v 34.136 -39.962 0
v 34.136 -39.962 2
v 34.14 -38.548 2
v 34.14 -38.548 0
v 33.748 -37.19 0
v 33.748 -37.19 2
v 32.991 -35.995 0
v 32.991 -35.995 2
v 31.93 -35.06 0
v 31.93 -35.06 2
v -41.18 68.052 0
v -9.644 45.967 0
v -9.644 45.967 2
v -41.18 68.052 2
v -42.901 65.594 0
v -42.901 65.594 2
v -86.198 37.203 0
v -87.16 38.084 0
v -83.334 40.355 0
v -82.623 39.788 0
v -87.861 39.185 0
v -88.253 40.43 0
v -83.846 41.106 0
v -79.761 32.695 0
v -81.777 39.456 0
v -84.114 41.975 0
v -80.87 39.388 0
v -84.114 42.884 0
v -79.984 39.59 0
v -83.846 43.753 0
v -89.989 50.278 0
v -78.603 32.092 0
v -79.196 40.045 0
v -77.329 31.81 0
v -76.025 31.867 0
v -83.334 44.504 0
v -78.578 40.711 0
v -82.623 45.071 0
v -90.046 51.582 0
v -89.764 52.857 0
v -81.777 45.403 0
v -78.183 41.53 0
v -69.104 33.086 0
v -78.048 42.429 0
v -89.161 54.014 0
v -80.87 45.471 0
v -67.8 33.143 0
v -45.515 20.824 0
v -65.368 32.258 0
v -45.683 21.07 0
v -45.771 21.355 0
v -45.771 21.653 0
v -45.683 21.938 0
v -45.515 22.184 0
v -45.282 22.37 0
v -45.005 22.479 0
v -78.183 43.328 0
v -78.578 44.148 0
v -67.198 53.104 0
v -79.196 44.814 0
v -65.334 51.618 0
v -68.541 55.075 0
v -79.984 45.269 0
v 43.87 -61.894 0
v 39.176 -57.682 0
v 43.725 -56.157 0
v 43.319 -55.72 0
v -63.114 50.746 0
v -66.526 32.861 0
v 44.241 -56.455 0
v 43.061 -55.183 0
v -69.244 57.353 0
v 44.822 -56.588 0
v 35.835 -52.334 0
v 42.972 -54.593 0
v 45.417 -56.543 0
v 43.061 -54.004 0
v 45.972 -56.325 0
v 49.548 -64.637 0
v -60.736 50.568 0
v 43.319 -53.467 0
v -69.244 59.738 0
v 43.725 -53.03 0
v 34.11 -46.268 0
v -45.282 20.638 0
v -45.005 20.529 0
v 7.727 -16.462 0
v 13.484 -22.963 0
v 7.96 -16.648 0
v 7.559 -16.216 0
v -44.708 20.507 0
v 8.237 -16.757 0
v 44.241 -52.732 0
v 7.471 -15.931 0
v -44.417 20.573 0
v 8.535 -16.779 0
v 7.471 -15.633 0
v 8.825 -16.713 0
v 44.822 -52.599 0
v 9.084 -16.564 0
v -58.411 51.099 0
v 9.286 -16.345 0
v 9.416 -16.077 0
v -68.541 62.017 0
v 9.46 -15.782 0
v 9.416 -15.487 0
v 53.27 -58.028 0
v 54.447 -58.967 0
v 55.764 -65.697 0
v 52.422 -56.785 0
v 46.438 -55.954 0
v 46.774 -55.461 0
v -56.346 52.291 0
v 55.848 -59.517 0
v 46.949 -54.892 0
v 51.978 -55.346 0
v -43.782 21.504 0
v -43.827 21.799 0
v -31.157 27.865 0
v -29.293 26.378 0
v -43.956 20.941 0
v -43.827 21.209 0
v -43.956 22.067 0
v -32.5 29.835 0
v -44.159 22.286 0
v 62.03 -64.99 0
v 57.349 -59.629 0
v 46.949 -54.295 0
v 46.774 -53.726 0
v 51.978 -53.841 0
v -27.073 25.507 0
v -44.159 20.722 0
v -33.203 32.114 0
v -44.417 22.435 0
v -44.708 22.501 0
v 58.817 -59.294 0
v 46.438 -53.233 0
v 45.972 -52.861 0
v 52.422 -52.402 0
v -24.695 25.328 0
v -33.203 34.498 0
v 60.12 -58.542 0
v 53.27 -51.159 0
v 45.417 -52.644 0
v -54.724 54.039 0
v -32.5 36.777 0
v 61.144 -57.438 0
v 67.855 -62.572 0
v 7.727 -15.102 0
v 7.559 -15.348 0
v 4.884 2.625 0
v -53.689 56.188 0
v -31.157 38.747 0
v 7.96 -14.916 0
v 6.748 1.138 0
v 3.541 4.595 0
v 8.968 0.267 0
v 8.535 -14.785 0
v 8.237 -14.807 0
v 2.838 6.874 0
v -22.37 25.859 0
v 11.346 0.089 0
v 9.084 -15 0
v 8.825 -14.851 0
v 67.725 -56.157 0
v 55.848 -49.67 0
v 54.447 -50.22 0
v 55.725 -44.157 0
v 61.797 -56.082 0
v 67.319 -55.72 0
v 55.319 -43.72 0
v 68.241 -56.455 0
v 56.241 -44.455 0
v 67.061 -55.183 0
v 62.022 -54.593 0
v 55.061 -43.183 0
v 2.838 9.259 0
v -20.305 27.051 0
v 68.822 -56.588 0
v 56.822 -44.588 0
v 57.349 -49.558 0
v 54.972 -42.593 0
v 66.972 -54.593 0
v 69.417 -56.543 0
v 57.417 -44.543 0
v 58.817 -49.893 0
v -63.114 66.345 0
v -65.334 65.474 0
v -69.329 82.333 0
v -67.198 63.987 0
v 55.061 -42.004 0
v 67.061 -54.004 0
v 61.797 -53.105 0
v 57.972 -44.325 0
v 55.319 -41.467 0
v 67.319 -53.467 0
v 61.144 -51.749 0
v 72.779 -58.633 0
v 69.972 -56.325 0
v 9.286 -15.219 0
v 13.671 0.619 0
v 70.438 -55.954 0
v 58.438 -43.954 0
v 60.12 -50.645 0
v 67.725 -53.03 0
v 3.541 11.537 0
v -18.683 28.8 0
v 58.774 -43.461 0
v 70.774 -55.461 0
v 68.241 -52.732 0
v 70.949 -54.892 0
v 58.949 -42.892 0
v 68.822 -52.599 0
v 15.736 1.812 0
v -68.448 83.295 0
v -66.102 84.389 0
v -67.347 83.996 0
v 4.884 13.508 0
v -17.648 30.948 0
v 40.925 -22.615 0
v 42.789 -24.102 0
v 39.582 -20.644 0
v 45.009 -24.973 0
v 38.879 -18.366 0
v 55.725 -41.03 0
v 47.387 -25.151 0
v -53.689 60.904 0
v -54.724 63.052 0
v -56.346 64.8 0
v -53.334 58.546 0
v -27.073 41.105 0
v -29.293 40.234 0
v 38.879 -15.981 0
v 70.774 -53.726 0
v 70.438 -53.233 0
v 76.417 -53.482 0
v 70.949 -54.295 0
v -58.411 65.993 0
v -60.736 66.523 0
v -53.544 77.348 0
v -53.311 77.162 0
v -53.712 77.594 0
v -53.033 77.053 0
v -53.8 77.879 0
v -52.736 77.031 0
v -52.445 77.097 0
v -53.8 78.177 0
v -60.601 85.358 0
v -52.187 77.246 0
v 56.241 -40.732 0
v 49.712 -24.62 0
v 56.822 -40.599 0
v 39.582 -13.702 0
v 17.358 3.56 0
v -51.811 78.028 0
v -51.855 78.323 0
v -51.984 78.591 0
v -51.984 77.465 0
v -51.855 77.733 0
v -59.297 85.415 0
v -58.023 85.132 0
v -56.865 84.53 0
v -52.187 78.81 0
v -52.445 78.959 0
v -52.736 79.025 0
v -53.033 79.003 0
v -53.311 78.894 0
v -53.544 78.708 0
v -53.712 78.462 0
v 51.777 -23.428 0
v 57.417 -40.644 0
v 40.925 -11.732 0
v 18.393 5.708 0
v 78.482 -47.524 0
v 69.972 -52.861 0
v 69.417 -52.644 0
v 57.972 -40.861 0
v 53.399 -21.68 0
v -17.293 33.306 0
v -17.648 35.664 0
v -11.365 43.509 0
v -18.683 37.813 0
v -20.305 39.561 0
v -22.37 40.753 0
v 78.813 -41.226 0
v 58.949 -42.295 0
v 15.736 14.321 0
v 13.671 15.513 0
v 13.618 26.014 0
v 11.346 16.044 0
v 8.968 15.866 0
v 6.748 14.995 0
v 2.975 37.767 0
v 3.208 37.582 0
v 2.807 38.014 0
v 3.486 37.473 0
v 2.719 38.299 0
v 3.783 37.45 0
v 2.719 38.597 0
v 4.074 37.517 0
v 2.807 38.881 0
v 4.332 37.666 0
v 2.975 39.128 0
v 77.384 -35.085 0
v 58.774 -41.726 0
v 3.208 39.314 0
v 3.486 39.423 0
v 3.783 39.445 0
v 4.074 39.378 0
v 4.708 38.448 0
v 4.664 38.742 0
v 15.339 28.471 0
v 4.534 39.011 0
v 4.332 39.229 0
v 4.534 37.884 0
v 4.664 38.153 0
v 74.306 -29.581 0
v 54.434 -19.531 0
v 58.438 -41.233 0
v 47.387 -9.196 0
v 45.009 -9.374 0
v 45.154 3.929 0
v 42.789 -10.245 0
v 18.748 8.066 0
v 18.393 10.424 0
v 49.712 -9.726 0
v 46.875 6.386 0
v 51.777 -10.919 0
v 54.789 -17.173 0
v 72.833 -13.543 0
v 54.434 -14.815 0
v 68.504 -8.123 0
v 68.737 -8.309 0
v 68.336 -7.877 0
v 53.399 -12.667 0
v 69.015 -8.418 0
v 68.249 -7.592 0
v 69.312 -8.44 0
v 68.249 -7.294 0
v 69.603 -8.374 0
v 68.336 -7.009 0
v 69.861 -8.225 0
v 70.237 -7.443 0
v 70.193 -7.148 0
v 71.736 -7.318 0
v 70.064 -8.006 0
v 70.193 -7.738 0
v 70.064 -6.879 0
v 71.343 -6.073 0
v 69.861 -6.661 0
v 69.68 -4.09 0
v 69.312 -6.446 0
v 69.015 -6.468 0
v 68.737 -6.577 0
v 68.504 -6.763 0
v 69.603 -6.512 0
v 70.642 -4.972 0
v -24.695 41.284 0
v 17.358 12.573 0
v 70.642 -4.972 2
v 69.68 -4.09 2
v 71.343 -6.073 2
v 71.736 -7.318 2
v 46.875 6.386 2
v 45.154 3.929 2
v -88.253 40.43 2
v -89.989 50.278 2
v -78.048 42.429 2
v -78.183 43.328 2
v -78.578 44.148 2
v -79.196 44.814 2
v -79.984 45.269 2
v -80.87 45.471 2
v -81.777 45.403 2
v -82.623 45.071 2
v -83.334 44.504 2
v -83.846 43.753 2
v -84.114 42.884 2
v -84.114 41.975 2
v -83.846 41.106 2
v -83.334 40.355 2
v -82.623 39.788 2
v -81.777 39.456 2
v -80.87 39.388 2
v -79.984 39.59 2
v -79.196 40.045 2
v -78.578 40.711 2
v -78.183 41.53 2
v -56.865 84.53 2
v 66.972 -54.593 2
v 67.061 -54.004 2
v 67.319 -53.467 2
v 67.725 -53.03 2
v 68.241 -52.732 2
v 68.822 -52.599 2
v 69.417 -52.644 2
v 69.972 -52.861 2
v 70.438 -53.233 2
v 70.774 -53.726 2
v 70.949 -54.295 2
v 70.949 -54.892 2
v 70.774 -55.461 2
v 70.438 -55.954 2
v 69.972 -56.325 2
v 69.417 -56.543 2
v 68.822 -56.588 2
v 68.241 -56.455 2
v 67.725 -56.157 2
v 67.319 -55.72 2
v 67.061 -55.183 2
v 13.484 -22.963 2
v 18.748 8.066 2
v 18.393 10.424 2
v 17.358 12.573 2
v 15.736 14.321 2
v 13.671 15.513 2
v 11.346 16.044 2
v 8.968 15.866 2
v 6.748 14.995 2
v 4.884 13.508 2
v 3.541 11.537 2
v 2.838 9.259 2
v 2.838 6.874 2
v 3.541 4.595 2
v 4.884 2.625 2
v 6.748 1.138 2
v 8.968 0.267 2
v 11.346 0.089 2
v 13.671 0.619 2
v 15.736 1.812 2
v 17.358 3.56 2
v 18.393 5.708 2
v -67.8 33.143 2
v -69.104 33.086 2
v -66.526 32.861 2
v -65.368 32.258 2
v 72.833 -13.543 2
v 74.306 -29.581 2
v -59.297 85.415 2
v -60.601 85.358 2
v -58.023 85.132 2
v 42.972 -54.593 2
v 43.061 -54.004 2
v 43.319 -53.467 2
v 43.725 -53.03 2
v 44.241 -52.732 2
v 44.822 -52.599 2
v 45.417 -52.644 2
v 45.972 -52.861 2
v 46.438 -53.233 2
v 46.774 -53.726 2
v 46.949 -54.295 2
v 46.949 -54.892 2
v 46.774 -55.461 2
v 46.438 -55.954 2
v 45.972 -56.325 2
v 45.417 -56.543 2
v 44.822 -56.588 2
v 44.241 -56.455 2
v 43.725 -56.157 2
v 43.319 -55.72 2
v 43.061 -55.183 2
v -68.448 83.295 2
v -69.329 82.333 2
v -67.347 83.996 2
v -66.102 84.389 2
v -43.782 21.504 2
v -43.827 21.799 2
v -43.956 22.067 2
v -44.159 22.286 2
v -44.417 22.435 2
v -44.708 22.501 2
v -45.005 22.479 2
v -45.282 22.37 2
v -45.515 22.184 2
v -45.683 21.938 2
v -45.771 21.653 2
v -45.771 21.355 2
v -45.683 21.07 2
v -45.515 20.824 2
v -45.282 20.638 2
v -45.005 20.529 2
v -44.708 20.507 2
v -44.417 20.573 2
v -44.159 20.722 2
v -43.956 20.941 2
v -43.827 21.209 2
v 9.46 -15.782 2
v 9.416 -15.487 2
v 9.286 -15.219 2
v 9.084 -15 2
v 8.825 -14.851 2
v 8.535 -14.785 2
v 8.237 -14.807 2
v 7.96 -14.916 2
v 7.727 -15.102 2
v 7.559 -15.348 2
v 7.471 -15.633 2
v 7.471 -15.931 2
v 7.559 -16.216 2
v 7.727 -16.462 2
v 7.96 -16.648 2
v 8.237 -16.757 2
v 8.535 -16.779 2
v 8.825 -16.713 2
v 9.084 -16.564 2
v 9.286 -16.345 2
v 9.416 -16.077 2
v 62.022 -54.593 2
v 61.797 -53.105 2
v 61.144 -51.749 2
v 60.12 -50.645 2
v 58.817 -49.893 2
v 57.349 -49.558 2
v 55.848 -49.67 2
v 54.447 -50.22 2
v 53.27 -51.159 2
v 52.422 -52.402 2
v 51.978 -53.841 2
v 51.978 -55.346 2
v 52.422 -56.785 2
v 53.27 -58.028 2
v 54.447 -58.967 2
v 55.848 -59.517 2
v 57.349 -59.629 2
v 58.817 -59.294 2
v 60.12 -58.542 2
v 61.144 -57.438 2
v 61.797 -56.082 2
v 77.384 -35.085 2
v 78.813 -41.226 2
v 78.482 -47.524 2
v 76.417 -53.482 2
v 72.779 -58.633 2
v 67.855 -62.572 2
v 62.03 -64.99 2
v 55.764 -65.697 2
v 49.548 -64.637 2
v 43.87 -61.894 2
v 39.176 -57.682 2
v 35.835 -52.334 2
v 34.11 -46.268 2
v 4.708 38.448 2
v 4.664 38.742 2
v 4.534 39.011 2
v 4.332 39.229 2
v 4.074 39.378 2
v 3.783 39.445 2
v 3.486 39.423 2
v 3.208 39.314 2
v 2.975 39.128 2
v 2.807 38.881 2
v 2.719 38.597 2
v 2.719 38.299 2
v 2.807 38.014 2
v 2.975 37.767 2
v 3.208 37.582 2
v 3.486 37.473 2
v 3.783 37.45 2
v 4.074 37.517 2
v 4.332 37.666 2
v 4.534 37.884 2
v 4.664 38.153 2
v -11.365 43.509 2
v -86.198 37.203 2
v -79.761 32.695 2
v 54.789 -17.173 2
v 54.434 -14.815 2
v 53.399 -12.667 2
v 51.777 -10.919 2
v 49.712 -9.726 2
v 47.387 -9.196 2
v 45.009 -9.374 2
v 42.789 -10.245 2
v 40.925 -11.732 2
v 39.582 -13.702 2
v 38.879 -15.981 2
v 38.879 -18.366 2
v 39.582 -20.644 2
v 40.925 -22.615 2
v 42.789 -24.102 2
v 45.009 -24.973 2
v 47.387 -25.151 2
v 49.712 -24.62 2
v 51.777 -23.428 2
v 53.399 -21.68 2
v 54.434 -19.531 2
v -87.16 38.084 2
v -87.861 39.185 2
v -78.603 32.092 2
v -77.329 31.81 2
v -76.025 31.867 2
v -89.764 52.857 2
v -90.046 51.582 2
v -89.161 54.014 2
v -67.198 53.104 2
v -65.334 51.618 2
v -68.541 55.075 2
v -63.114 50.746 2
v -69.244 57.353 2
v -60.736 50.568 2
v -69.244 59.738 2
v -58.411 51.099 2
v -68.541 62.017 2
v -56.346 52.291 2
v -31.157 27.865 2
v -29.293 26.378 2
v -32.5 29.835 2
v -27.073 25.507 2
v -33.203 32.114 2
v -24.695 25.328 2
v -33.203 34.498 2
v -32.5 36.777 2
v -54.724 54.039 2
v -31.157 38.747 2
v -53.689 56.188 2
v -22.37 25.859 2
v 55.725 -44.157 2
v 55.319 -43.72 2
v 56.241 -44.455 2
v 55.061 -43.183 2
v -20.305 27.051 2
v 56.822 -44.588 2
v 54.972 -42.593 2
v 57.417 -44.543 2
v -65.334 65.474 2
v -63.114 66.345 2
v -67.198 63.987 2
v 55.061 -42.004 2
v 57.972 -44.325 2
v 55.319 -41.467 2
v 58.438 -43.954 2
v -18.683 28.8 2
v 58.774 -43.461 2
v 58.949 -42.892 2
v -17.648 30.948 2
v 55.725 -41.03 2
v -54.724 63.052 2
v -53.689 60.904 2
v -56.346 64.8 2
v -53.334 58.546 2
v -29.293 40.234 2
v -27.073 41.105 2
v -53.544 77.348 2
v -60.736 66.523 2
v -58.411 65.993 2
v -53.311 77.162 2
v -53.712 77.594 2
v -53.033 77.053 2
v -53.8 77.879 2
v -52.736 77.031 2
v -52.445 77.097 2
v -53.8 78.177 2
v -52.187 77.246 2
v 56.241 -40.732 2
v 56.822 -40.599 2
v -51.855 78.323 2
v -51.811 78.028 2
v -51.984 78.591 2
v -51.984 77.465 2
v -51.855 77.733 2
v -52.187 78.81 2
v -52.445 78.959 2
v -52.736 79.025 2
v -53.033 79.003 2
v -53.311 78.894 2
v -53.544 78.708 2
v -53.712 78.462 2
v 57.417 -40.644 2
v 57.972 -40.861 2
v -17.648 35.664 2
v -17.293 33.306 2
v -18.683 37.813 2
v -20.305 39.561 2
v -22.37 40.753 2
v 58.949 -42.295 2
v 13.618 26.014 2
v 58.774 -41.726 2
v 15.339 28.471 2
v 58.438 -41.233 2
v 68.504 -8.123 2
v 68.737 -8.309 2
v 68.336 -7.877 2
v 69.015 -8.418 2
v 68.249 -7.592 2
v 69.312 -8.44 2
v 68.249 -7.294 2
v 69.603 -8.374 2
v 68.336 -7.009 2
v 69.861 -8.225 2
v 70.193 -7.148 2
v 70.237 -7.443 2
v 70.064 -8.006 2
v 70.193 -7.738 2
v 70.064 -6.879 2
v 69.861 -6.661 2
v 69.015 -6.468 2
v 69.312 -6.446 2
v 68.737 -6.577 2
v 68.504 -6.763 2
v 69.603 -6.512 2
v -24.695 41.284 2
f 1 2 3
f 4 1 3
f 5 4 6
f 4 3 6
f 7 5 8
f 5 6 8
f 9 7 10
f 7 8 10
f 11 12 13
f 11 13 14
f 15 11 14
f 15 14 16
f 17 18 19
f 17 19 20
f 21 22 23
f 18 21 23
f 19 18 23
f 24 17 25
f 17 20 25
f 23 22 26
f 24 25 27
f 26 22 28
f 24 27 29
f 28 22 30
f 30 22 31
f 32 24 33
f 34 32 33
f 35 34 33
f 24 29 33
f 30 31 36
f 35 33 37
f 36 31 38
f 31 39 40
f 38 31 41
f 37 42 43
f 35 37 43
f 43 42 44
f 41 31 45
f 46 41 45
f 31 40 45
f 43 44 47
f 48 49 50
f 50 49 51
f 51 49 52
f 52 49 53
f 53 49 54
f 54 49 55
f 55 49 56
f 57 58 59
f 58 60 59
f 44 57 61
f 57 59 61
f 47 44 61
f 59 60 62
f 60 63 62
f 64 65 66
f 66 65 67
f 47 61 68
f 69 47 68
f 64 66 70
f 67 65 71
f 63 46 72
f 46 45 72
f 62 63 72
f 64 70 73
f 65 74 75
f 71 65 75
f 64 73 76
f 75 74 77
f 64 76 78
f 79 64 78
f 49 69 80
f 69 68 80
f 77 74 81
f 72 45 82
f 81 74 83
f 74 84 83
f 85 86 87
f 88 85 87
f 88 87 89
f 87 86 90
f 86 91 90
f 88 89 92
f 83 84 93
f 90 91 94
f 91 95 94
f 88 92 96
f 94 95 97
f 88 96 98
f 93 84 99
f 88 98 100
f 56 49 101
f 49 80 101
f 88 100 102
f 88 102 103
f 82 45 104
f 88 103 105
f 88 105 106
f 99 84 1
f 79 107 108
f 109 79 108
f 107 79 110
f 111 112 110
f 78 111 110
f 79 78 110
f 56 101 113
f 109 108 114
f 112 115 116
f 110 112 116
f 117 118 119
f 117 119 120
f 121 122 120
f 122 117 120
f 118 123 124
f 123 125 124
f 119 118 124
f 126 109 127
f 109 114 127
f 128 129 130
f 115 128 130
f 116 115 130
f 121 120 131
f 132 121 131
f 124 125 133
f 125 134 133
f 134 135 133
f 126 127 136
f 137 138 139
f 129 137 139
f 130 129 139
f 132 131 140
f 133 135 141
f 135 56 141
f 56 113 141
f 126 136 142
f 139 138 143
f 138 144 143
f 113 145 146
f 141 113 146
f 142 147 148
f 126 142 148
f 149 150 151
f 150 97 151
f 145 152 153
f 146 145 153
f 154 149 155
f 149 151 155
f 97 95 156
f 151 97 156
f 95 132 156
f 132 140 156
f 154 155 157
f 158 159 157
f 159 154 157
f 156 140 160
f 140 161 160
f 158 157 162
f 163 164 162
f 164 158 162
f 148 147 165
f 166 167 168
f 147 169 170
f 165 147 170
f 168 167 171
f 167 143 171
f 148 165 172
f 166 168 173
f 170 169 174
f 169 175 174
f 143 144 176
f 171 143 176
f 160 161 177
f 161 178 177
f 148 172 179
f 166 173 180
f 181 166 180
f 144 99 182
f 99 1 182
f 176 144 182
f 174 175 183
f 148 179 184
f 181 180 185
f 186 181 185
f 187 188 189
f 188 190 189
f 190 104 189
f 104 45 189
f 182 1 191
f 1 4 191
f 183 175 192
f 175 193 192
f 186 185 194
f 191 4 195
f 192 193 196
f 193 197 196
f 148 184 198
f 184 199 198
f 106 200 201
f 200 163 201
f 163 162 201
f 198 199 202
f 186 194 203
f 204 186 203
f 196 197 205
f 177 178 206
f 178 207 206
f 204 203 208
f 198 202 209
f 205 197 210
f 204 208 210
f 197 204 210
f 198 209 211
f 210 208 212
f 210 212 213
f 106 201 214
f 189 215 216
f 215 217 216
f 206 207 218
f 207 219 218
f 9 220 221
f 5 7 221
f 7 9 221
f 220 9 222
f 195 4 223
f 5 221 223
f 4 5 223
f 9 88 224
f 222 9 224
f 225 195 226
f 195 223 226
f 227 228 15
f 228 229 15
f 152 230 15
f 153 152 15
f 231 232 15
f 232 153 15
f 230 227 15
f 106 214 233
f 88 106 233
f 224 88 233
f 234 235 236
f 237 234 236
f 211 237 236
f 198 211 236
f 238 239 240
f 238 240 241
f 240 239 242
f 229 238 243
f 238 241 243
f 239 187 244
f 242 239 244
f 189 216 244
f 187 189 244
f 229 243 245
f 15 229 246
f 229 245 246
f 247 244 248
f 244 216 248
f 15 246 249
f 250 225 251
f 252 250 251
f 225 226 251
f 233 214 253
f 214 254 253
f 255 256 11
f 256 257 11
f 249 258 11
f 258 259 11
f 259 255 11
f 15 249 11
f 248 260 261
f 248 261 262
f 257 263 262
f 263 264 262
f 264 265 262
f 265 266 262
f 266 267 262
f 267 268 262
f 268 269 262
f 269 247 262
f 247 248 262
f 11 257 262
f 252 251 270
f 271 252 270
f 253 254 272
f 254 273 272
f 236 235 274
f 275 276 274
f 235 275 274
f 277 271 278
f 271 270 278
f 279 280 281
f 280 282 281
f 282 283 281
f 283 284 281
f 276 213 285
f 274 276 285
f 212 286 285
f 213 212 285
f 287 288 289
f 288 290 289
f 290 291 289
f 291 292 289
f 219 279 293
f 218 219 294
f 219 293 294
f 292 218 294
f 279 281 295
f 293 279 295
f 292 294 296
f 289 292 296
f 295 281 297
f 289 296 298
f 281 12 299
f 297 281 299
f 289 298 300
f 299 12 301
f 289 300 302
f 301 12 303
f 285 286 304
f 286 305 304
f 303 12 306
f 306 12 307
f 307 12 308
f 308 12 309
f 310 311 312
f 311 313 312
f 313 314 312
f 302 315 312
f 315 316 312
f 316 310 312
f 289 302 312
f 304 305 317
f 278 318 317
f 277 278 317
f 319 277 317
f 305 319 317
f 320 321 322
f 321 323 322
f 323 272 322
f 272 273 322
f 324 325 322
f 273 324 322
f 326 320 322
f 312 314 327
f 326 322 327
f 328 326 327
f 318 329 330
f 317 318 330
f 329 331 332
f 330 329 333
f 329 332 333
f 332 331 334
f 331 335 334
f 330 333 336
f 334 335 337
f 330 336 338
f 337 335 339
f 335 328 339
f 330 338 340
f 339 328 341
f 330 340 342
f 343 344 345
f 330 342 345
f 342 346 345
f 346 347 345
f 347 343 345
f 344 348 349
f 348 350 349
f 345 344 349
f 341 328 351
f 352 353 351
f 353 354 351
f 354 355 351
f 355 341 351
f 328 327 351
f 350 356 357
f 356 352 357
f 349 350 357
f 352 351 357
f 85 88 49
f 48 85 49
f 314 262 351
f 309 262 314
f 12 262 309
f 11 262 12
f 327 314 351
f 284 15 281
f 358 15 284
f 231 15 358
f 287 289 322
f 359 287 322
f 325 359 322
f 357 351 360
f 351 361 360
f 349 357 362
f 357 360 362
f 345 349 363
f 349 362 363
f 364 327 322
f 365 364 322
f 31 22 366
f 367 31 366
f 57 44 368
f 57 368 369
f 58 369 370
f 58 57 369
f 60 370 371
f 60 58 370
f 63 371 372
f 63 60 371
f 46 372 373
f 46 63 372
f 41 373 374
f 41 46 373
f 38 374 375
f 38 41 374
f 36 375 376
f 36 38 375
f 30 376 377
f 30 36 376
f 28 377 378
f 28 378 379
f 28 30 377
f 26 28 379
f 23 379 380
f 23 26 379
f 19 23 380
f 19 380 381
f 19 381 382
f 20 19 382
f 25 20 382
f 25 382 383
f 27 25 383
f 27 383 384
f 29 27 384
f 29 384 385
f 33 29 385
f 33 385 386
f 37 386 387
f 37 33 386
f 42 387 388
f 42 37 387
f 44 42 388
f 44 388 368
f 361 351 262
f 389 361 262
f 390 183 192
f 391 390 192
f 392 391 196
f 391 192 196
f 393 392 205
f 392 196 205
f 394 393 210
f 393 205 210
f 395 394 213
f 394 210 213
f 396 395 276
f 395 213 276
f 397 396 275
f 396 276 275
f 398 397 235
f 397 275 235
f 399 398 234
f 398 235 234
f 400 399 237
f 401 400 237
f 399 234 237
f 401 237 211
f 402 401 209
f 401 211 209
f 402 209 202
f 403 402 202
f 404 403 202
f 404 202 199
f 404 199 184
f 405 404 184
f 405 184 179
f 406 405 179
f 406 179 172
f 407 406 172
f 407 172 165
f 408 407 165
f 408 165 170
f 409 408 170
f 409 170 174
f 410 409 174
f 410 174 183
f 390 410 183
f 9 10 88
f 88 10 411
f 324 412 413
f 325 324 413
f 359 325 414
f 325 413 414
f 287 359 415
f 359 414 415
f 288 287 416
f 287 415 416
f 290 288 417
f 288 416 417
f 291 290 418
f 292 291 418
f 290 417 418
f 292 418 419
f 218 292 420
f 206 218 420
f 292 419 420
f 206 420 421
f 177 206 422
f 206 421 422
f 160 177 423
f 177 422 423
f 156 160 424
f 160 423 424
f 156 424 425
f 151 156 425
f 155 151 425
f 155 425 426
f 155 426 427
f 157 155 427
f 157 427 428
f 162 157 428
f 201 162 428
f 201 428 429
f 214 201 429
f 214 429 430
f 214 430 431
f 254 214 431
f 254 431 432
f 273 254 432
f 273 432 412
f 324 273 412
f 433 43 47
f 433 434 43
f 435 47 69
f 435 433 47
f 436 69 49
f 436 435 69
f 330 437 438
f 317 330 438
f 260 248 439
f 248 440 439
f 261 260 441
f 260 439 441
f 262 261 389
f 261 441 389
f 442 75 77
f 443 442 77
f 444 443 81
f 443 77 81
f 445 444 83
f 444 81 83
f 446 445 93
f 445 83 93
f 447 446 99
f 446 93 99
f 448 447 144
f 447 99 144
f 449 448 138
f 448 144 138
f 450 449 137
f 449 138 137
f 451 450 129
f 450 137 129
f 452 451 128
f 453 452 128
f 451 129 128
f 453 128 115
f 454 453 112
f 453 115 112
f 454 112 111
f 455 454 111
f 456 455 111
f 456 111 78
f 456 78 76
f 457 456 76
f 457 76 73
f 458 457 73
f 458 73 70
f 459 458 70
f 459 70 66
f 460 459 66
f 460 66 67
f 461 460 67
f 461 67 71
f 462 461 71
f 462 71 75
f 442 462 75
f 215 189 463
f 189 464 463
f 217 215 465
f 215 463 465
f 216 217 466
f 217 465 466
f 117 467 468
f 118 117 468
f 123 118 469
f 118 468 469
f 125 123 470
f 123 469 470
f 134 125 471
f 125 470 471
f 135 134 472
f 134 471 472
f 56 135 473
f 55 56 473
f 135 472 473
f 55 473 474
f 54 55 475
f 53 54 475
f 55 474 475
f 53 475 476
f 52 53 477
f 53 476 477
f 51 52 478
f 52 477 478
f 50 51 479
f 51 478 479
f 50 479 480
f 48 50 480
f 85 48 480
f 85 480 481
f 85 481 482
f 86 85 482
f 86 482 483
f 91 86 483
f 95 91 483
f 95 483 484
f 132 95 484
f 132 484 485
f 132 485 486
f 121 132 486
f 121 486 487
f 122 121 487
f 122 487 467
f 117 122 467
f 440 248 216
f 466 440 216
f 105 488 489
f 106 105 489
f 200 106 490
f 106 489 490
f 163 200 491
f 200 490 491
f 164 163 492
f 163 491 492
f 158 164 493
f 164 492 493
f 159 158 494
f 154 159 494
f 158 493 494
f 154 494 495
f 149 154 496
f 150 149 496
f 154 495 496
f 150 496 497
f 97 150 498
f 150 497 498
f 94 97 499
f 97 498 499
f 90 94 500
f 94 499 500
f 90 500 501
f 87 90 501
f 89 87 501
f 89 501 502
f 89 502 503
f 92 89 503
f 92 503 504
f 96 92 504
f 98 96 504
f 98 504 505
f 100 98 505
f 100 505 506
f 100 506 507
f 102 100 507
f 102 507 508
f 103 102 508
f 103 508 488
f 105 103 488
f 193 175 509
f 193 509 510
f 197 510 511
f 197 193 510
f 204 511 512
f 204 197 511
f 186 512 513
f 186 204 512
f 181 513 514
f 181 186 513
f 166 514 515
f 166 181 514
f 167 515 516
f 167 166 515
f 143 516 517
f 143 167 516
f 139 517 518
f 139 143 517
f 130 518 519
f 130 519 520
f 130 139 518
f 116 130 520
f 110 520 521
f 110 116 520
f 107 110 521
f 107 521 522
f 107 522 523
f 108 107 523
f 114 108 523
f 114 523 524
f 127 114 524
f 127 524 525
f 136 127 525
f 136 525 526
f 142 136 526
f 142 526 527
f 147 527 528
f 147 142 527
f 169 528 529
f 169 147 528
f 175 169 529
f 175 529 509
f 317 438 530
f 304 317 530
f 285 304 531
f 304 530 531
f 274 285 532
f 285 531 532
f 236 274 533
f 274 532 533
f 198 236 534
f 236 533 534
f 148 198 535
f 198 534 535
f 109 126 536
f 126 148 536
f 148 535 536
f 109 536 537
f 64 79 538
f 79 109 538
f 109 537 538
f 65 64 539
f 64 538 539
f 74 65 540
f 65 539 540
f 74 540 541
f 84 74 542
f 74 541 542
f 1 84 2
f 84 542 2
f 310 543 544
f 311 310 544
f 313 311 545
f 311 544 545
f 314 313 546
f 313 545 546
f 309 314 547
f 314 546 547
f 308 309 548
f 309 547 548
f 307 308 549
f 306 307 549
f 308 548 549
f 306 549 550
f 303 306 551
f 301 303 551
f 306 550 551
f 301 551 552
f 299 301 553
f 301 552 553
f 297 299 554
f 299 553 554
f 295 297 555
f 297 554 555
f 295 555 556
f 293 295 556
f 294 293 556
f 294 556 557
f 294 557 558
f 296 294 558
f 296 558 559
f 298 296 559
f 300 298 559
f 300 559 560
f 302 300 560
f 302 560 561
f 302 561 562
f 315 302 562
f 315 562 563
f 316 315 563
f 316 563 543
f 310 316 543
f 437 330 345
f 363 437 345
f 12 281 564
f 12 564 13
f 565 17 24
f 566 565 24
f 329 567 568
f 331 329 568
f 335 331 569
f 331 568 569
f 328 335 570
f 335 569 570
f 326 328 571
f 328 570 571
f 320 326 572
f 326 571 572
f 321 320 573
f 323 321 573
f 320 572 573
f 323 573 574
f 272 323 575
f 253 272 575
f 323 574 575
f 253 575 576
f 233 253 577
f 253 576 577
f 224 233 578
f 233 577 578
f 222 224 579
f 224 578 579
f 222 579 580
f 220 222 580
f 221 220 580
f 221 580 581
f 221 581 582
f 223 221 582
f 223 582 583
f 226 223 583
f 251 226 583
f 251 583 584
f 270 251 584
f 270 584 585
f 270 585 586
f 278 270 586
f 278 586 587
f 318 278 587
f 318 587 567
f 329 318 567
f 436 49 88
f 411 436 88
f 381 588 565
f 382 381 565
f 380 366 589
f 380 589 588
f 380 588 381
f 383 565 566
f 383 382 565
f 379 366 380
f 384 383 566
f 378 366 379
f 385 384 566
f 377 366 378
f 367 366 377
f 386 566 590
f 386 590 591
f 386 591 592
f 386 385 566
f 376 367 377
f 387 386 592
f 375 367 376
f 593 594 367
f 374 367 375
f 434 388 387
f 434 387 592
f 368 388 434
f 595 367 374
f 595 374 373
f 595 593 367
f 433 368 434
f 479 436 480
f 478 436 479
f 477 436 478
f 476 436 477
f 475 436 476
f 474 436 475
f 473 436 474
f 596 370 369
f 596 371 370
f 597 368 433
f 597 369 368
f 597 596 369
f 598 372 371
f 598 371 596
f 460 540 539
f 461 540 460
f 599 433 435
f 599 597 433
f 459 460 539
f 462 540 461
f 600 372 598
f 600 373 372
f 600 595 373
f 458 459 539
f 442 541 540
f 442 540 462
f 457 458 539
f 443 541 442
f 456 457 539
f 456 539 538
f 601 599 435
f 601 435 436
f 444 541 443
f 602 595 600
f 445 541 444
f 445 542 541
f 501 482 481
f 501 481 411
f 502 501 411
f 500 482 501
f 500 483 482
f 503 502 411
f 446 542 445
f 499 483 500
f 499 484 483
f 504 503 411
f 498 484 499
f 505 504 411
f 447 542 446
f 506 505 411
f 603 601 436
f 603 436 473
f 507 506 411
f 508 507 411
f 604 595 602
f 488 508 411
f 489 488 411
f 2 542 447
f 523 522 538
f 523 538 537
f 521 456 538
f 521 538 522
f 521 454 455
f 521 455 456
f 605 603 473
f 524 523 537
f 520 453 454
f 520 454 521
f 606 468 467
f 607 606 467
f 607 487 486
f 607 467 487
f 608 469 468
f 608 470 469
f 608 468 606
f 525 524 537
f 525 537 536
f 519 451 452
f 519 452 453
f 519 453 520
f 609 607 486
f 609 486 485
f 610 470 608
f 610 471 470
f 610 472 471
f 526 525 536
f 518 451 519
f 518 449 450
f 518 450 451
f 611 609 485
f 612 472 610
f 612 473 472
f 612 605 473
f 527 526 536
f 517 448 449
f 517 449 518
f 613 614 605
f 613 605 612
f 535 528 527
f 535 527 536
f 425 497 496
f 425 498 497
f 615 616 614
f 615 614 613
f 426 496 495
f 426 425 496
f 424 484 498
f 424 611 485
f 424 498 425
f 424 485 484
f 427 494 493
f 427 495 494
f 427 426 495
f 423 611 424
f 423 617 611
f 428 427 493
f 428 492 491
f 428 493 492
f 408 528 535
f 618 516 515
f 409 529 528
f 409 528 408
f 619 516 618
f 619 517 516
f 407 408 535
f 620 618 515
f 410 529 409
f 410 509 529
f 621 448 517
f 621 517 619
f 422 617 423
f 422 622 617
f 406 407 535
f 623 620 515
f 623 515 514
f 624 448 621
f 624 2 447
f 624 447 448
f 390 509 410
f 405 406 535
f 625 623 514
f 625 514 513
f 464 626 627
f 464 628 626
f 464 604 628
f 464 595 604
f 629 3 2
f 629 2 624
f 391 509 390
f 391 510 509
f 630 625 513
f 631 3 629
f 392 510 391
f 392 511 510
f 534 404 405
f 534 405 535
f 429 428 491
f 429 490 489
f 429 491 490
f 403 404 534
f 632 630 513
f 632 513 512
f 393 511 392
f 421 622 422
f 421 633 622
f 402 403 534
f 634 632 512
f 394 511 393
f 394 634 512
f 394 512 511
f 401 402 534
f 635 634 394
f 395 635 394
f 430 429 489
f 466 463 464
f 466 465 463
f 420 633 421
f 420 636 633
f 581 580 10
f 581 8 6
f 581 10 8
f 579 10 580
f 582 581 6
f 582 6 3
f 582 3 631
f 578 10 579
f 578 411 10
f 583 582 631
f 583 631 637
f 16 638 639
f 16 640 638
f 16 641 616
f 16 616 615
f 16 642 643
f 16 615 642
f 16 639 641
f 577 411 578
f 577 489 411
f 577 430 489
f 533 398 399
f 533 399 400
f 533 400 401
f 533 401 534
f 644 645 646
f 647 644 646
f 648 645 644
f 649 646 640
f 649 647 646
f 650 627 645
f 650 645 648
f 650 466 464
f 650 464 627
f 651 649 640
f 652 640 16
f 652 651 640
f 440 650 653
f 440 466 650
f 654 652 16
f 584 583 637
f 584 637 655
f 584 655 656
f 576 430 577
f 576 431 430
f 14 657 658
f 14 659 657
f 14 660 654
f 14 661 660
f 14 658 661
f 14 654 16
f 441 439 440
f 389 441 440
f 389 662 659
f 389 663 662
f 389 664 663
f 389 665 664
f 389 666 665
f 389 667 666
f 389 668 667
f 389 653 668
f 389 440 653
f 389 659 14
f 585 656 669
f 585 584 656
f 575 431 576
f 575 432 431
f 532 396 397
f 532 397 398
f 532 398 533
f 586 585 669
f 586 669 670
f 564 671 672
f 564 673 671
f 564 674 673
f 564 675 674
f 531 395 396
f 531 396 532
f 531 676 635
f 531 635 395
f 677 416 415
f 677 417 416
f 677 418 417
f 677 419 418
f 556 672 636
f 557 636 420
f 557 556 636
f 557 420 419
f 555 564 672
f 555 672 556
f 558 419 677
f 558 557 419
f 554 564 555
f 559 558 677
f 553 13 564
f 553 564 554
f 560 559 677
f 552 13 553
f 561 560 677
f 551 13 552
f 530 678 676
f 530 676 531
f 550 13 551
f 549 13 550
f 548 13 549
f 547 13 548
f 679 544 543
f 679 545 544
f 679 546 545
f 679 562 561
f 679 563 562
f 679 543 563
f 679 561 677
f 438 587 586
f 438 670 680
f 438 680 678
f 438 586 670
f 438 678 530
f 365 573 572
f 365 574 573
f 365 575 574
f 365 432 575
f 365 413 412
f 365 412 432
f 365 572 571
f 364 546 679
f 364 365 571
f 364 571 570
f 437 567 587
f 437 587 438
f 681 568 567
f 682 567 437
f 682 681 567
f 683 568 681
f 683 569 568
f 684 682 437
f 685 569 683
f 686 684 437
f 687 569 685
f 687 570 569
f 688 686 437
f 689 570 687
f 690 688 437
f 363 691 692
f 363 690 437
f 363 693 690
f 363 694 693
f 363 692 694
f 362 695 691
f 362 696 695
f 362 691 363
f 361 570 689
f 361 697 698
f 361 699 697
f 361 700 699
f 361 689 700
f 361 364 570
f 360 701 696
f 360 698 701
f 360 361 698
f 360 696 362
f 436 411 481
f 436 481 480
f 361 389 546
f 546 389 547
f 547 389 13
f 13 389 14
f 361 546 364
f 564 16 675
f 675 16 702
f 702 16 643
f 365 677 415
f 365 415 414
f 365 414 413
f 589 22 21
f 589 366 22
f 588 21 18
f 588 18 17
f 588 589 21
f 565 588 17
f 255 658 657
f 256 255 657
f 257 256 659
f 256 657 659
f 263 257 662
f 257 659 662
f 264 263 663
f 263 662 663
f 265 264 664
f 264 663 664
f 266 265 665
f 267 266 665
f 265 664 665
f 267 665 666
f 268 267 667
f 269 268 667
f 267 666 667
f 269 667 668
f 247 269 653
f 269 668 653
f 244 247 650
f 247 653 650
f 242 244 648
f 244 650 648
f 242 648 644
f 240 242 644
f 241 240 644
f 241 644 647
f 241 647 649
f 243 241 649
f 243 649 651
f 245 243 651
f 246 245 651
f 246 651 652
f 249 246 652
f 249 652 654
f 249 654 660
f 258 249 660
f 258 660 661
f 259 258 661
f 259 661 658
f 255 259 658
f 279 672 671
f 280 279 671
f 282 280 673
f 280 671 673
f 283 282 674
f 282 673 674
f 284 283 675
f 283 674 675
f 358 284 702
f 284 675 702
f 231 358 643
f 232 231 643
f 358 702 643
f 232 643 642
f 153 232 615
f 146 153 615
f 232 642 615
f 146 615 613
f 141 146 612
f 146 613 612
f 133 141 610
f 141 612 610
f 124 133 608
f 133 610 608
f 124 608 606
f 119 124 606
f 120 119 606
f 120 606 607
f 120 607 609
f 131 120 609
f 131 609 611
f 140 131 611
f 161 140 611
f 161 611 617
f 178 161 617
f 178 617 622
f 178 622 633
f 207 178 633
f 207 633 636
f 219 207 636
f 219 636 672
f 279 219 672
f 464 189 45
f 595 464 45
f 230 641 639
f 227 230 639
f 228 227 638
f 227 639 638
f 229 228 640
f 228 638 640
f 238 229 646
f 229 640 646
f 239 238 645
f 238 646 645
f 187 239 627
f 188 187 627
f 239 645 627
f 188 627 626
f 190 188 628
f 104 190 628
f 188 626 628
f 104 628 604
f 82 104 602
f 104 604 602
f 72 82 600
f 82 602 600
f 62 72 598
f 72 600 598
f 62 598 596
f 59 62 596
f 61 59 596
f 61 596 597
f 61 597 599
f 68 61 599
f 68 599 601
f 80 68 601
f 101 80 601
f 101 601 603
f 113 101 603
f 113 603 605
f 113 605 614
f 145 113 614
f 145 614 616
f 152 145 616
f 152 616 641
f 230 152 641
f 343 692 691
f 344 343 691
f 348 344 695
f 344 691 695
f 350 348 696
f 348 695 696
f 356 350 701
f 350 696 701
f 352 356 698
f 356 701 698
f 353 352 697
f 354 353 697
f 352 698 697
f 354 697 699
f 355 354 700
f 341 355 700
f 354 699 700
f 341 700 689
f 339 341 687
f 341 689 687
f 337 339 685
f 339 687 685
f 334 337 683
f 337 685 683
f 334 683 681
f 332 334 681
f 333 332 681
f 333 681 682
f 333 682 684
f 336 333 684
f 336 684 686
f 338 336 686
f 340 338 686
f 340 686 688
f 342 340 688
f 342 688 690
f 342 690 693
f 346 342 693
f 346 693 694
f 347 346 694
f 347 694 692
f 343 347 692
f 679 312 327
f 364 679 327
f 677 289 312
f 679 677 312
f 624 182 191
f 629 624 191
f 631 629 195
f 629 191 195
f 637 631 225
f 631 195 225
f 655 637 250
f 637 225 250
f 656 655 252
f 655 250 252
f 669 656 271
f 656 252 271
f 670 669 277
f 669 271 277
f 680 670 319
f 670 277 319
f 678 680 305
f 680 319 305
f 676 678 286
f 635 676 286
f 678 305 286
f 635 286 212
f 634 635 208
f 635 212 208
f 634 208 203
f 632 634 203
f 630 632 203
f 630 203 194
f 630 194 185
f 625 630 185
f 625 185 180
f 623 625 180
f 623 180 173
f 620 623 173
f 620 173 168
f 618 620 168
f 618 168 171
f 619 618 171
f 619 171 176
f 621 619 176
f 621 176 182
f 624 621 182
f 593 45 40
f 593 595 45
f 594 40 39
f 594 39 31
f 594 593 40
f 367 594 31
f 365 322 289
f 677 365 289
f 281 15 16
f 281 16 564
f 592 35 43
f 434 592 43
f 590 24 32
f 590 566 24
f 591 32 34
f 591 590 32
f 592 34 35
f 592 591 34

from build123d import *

# Parameters (mm, degrees)
SKETCH_1_R          = 5.05
SKETCH_1_R_2        = 3.05
EXTRUDE_1_DEPTH     = 2
SKETCH_4_R          = 8
CUT_EXTRUDE_2_DEPTH = 10
CHAMFER_4_SIZE      = 10
FILLET_1_R          = 5
SKETCH_5_R          = 2
CUT_EXTRUDE_3_DEPTH = 10
SKETCH_6_R          = 1
CUT_EXTRUDE_4_DEPTH = 10
CUT_EXTRUDE_5_DEPTH = 10
CUT_EXTRUDE_6_DEPTH = 3


with BuildPart() as part:
    # 草图1 → 凸台-拉伸1 (new body)
    with BuildSketch(Plane.XY):
        with BuildLine():
            Line((-58.561307239, 85.717685223), (-68.14143119, 84.029090729))
            Line((-68.14143119, 84.029090729), (-96.085099854, 44.126897339))
            Line((-96.085099854, 44.126897339), (-78.064572289, 31.507048438))
            Line((-78.064572289, 31.507048438), (-67.064872022, 33.445857727))
            Line((-67.064872022, 33.445857727), (32.399547585, -36.209480718))
            ThreePointArc((32.399547585, -36.209480718), (61.848825623, -67.605100723), (75.145579183, -26.664396317))
            Line((75.145579183, -26.664396317), (71.375998152, -5.277939337))
            Line((71.375998152, -5.277939337), (-58.561307239, 85.717685223))
        make_face()
        with Locations((56.971703287, -54.593433609)):
            Circle(SKETCH_1_R, mode=Mode.SUBTRACT)
        with Locations((-81.097830738, 42.429451993)):
            Circle(SKETCH_1_R_2, mode=Mode.SUBTRACT)
    extrude(amount=EXTRUDE_1_DEPTH)

    # 草图4 → 切除-拉伸2 (cut)
    with BuildSketch(Plane.XY.offset(2)):
        with Locations((-61.33373119, 58.54577073)):
            Circle(SKETCH_4_R)
        with Locations((-25.29267606, 33.306072927)):
            Circle(SKETCH_4_R)
        with Locations((10.74837907, 8.066375125)):
            Circle(SKETCH_4_R)
        with Locations((46.789434199, -17.173322677)):
            Circle(SKETCH_4_R)
    extrude(amount=-CUT_EXTRUDE_2_DEPTH, mode=Mode.SUBTRACT)

    # 倒角4
    chamfer_4_edges = [part.edges().sort_by_distance(p)[0] for p in [
        (-96.085099854, 44.126897339, 1),
    ]]
    chamfer(chamfer_4_edges, length=CHAMFER_4_SIZE)

    # 圆角1
    fillet_1_edges = [part.edges().sort_by_distance(p)[0] for p in [
        (-68.14143119, 84.029090729, 1),
        (-58.561307239, 85.717685223, 1),
        (71.375998152, -5.277939337, 1),
        (32.399547585, -36.209480718, 1),
        (-67.064872022, 33.445857727, 1),
        (-78.064572289, 31.507048438, 1),
        (-87.893950961, 38.390602384, 1),
        (-90.348804899, 52.318046232, 1),
    ]]
    fillet(fillet_1_edges, radius=FILLET_1_R)

    # 草图5 → 切除-拉伸3 (cut)
    with BuildSketch(Plane(origin=(0, 0, 0), x_dir=(-1, 0, 0), z_dir=(0, 0, -1))):
        with Locations((-56.971703287, -42.593433609)):
            Circle(SKETCH_5_R)
        with Locations((-44.971703287, -54.593433609)):
            Circle(SKETCH_5_R)
        with Locations((-68.971703287, -54.593433609)):
            Circle(SKETCH_5_R)
    extrude(amount=-CUT_EXTRUDE_3_DEPTH, mode=Mode.SUBTRACT)

    # 草图6 → 切除-拉伸4 (cut)
    with BuildSketch(Plane.XY.offset(2)):
        with Locations((-52.81071672, 78.028033355)):
            Circle(SKETCH_6_R)
        with Locations((3.708210642, 38.447598165)):
            Circle(SKETCH_6_R)
        with Locations((69.237401787, -7.442761475)):
            Circle(SKETCH_6_R)
        with Locations((-44.782446967, 21.503874532)):
            Circle(SKETCH_6_R)
        with Locations((8.460020838, -15.782042676)):
            Circle(SKETCH_6_R)
    extrude(amount=-CUT_EXTRUDE_4_DEPTH, mode=Mode.SUBTRACT)

    # 草图7 → 切除-拉伸5 (cut)
    with BuildSketch(Plane(origin=(0, 0, 0), x_dir=(-1, 0, 0), z_dir=(0, 0, -1))):
        Polygon((42.900547388, 65.594166547), (11.364624149, 43.50943097), (9.643735663, 45.966775638), (41.179658901, 68.051511215), align=None)
        Polygon((-45.154303213, 3.92899578), (-13.618379974, 26.013731357), (-15.339268461, 28.471076025), (-46.875191699, 6.386340448), align=None)
    extrude(amount=-CUT_EXTRUDE_5_DEPTH, mode=Mode.SUBTRACT)

    # 草图8 → 切除-拉伸6 (cut, through all)
    with BuildSketch(Plane.XY.offset(2)):
        with BuildLine():
            Line((31.929922098, -35.060209846), (13.483519413, -22.962509091))
            Line((13.483519413, -22.962509091), (28.325536176, -95.018326982))
            Line((28.325536176, -95.018326982), (121.098918435, -54.025437146))
            Line((121.098918435, -54.025437146), (72.832718458, -13.542541133))
            Line((72.832718458, -13.542541133), (74.305789634, -29.580542184))
            ThreePointArc((74.305789634, -29.580542184), (62.030487783, -64.990252685), (34.135631, -39.96211655))
            ThreePointArc((34.135631, -39.96211655), (33.747527426, -37.189547046), (31.929922098, -35.060209846))
        make_face()
    extrude(amount=-CUT_EXTRUDE_6_DEPTH, mode=Mode.SUBTRACT)


solid = part.part
